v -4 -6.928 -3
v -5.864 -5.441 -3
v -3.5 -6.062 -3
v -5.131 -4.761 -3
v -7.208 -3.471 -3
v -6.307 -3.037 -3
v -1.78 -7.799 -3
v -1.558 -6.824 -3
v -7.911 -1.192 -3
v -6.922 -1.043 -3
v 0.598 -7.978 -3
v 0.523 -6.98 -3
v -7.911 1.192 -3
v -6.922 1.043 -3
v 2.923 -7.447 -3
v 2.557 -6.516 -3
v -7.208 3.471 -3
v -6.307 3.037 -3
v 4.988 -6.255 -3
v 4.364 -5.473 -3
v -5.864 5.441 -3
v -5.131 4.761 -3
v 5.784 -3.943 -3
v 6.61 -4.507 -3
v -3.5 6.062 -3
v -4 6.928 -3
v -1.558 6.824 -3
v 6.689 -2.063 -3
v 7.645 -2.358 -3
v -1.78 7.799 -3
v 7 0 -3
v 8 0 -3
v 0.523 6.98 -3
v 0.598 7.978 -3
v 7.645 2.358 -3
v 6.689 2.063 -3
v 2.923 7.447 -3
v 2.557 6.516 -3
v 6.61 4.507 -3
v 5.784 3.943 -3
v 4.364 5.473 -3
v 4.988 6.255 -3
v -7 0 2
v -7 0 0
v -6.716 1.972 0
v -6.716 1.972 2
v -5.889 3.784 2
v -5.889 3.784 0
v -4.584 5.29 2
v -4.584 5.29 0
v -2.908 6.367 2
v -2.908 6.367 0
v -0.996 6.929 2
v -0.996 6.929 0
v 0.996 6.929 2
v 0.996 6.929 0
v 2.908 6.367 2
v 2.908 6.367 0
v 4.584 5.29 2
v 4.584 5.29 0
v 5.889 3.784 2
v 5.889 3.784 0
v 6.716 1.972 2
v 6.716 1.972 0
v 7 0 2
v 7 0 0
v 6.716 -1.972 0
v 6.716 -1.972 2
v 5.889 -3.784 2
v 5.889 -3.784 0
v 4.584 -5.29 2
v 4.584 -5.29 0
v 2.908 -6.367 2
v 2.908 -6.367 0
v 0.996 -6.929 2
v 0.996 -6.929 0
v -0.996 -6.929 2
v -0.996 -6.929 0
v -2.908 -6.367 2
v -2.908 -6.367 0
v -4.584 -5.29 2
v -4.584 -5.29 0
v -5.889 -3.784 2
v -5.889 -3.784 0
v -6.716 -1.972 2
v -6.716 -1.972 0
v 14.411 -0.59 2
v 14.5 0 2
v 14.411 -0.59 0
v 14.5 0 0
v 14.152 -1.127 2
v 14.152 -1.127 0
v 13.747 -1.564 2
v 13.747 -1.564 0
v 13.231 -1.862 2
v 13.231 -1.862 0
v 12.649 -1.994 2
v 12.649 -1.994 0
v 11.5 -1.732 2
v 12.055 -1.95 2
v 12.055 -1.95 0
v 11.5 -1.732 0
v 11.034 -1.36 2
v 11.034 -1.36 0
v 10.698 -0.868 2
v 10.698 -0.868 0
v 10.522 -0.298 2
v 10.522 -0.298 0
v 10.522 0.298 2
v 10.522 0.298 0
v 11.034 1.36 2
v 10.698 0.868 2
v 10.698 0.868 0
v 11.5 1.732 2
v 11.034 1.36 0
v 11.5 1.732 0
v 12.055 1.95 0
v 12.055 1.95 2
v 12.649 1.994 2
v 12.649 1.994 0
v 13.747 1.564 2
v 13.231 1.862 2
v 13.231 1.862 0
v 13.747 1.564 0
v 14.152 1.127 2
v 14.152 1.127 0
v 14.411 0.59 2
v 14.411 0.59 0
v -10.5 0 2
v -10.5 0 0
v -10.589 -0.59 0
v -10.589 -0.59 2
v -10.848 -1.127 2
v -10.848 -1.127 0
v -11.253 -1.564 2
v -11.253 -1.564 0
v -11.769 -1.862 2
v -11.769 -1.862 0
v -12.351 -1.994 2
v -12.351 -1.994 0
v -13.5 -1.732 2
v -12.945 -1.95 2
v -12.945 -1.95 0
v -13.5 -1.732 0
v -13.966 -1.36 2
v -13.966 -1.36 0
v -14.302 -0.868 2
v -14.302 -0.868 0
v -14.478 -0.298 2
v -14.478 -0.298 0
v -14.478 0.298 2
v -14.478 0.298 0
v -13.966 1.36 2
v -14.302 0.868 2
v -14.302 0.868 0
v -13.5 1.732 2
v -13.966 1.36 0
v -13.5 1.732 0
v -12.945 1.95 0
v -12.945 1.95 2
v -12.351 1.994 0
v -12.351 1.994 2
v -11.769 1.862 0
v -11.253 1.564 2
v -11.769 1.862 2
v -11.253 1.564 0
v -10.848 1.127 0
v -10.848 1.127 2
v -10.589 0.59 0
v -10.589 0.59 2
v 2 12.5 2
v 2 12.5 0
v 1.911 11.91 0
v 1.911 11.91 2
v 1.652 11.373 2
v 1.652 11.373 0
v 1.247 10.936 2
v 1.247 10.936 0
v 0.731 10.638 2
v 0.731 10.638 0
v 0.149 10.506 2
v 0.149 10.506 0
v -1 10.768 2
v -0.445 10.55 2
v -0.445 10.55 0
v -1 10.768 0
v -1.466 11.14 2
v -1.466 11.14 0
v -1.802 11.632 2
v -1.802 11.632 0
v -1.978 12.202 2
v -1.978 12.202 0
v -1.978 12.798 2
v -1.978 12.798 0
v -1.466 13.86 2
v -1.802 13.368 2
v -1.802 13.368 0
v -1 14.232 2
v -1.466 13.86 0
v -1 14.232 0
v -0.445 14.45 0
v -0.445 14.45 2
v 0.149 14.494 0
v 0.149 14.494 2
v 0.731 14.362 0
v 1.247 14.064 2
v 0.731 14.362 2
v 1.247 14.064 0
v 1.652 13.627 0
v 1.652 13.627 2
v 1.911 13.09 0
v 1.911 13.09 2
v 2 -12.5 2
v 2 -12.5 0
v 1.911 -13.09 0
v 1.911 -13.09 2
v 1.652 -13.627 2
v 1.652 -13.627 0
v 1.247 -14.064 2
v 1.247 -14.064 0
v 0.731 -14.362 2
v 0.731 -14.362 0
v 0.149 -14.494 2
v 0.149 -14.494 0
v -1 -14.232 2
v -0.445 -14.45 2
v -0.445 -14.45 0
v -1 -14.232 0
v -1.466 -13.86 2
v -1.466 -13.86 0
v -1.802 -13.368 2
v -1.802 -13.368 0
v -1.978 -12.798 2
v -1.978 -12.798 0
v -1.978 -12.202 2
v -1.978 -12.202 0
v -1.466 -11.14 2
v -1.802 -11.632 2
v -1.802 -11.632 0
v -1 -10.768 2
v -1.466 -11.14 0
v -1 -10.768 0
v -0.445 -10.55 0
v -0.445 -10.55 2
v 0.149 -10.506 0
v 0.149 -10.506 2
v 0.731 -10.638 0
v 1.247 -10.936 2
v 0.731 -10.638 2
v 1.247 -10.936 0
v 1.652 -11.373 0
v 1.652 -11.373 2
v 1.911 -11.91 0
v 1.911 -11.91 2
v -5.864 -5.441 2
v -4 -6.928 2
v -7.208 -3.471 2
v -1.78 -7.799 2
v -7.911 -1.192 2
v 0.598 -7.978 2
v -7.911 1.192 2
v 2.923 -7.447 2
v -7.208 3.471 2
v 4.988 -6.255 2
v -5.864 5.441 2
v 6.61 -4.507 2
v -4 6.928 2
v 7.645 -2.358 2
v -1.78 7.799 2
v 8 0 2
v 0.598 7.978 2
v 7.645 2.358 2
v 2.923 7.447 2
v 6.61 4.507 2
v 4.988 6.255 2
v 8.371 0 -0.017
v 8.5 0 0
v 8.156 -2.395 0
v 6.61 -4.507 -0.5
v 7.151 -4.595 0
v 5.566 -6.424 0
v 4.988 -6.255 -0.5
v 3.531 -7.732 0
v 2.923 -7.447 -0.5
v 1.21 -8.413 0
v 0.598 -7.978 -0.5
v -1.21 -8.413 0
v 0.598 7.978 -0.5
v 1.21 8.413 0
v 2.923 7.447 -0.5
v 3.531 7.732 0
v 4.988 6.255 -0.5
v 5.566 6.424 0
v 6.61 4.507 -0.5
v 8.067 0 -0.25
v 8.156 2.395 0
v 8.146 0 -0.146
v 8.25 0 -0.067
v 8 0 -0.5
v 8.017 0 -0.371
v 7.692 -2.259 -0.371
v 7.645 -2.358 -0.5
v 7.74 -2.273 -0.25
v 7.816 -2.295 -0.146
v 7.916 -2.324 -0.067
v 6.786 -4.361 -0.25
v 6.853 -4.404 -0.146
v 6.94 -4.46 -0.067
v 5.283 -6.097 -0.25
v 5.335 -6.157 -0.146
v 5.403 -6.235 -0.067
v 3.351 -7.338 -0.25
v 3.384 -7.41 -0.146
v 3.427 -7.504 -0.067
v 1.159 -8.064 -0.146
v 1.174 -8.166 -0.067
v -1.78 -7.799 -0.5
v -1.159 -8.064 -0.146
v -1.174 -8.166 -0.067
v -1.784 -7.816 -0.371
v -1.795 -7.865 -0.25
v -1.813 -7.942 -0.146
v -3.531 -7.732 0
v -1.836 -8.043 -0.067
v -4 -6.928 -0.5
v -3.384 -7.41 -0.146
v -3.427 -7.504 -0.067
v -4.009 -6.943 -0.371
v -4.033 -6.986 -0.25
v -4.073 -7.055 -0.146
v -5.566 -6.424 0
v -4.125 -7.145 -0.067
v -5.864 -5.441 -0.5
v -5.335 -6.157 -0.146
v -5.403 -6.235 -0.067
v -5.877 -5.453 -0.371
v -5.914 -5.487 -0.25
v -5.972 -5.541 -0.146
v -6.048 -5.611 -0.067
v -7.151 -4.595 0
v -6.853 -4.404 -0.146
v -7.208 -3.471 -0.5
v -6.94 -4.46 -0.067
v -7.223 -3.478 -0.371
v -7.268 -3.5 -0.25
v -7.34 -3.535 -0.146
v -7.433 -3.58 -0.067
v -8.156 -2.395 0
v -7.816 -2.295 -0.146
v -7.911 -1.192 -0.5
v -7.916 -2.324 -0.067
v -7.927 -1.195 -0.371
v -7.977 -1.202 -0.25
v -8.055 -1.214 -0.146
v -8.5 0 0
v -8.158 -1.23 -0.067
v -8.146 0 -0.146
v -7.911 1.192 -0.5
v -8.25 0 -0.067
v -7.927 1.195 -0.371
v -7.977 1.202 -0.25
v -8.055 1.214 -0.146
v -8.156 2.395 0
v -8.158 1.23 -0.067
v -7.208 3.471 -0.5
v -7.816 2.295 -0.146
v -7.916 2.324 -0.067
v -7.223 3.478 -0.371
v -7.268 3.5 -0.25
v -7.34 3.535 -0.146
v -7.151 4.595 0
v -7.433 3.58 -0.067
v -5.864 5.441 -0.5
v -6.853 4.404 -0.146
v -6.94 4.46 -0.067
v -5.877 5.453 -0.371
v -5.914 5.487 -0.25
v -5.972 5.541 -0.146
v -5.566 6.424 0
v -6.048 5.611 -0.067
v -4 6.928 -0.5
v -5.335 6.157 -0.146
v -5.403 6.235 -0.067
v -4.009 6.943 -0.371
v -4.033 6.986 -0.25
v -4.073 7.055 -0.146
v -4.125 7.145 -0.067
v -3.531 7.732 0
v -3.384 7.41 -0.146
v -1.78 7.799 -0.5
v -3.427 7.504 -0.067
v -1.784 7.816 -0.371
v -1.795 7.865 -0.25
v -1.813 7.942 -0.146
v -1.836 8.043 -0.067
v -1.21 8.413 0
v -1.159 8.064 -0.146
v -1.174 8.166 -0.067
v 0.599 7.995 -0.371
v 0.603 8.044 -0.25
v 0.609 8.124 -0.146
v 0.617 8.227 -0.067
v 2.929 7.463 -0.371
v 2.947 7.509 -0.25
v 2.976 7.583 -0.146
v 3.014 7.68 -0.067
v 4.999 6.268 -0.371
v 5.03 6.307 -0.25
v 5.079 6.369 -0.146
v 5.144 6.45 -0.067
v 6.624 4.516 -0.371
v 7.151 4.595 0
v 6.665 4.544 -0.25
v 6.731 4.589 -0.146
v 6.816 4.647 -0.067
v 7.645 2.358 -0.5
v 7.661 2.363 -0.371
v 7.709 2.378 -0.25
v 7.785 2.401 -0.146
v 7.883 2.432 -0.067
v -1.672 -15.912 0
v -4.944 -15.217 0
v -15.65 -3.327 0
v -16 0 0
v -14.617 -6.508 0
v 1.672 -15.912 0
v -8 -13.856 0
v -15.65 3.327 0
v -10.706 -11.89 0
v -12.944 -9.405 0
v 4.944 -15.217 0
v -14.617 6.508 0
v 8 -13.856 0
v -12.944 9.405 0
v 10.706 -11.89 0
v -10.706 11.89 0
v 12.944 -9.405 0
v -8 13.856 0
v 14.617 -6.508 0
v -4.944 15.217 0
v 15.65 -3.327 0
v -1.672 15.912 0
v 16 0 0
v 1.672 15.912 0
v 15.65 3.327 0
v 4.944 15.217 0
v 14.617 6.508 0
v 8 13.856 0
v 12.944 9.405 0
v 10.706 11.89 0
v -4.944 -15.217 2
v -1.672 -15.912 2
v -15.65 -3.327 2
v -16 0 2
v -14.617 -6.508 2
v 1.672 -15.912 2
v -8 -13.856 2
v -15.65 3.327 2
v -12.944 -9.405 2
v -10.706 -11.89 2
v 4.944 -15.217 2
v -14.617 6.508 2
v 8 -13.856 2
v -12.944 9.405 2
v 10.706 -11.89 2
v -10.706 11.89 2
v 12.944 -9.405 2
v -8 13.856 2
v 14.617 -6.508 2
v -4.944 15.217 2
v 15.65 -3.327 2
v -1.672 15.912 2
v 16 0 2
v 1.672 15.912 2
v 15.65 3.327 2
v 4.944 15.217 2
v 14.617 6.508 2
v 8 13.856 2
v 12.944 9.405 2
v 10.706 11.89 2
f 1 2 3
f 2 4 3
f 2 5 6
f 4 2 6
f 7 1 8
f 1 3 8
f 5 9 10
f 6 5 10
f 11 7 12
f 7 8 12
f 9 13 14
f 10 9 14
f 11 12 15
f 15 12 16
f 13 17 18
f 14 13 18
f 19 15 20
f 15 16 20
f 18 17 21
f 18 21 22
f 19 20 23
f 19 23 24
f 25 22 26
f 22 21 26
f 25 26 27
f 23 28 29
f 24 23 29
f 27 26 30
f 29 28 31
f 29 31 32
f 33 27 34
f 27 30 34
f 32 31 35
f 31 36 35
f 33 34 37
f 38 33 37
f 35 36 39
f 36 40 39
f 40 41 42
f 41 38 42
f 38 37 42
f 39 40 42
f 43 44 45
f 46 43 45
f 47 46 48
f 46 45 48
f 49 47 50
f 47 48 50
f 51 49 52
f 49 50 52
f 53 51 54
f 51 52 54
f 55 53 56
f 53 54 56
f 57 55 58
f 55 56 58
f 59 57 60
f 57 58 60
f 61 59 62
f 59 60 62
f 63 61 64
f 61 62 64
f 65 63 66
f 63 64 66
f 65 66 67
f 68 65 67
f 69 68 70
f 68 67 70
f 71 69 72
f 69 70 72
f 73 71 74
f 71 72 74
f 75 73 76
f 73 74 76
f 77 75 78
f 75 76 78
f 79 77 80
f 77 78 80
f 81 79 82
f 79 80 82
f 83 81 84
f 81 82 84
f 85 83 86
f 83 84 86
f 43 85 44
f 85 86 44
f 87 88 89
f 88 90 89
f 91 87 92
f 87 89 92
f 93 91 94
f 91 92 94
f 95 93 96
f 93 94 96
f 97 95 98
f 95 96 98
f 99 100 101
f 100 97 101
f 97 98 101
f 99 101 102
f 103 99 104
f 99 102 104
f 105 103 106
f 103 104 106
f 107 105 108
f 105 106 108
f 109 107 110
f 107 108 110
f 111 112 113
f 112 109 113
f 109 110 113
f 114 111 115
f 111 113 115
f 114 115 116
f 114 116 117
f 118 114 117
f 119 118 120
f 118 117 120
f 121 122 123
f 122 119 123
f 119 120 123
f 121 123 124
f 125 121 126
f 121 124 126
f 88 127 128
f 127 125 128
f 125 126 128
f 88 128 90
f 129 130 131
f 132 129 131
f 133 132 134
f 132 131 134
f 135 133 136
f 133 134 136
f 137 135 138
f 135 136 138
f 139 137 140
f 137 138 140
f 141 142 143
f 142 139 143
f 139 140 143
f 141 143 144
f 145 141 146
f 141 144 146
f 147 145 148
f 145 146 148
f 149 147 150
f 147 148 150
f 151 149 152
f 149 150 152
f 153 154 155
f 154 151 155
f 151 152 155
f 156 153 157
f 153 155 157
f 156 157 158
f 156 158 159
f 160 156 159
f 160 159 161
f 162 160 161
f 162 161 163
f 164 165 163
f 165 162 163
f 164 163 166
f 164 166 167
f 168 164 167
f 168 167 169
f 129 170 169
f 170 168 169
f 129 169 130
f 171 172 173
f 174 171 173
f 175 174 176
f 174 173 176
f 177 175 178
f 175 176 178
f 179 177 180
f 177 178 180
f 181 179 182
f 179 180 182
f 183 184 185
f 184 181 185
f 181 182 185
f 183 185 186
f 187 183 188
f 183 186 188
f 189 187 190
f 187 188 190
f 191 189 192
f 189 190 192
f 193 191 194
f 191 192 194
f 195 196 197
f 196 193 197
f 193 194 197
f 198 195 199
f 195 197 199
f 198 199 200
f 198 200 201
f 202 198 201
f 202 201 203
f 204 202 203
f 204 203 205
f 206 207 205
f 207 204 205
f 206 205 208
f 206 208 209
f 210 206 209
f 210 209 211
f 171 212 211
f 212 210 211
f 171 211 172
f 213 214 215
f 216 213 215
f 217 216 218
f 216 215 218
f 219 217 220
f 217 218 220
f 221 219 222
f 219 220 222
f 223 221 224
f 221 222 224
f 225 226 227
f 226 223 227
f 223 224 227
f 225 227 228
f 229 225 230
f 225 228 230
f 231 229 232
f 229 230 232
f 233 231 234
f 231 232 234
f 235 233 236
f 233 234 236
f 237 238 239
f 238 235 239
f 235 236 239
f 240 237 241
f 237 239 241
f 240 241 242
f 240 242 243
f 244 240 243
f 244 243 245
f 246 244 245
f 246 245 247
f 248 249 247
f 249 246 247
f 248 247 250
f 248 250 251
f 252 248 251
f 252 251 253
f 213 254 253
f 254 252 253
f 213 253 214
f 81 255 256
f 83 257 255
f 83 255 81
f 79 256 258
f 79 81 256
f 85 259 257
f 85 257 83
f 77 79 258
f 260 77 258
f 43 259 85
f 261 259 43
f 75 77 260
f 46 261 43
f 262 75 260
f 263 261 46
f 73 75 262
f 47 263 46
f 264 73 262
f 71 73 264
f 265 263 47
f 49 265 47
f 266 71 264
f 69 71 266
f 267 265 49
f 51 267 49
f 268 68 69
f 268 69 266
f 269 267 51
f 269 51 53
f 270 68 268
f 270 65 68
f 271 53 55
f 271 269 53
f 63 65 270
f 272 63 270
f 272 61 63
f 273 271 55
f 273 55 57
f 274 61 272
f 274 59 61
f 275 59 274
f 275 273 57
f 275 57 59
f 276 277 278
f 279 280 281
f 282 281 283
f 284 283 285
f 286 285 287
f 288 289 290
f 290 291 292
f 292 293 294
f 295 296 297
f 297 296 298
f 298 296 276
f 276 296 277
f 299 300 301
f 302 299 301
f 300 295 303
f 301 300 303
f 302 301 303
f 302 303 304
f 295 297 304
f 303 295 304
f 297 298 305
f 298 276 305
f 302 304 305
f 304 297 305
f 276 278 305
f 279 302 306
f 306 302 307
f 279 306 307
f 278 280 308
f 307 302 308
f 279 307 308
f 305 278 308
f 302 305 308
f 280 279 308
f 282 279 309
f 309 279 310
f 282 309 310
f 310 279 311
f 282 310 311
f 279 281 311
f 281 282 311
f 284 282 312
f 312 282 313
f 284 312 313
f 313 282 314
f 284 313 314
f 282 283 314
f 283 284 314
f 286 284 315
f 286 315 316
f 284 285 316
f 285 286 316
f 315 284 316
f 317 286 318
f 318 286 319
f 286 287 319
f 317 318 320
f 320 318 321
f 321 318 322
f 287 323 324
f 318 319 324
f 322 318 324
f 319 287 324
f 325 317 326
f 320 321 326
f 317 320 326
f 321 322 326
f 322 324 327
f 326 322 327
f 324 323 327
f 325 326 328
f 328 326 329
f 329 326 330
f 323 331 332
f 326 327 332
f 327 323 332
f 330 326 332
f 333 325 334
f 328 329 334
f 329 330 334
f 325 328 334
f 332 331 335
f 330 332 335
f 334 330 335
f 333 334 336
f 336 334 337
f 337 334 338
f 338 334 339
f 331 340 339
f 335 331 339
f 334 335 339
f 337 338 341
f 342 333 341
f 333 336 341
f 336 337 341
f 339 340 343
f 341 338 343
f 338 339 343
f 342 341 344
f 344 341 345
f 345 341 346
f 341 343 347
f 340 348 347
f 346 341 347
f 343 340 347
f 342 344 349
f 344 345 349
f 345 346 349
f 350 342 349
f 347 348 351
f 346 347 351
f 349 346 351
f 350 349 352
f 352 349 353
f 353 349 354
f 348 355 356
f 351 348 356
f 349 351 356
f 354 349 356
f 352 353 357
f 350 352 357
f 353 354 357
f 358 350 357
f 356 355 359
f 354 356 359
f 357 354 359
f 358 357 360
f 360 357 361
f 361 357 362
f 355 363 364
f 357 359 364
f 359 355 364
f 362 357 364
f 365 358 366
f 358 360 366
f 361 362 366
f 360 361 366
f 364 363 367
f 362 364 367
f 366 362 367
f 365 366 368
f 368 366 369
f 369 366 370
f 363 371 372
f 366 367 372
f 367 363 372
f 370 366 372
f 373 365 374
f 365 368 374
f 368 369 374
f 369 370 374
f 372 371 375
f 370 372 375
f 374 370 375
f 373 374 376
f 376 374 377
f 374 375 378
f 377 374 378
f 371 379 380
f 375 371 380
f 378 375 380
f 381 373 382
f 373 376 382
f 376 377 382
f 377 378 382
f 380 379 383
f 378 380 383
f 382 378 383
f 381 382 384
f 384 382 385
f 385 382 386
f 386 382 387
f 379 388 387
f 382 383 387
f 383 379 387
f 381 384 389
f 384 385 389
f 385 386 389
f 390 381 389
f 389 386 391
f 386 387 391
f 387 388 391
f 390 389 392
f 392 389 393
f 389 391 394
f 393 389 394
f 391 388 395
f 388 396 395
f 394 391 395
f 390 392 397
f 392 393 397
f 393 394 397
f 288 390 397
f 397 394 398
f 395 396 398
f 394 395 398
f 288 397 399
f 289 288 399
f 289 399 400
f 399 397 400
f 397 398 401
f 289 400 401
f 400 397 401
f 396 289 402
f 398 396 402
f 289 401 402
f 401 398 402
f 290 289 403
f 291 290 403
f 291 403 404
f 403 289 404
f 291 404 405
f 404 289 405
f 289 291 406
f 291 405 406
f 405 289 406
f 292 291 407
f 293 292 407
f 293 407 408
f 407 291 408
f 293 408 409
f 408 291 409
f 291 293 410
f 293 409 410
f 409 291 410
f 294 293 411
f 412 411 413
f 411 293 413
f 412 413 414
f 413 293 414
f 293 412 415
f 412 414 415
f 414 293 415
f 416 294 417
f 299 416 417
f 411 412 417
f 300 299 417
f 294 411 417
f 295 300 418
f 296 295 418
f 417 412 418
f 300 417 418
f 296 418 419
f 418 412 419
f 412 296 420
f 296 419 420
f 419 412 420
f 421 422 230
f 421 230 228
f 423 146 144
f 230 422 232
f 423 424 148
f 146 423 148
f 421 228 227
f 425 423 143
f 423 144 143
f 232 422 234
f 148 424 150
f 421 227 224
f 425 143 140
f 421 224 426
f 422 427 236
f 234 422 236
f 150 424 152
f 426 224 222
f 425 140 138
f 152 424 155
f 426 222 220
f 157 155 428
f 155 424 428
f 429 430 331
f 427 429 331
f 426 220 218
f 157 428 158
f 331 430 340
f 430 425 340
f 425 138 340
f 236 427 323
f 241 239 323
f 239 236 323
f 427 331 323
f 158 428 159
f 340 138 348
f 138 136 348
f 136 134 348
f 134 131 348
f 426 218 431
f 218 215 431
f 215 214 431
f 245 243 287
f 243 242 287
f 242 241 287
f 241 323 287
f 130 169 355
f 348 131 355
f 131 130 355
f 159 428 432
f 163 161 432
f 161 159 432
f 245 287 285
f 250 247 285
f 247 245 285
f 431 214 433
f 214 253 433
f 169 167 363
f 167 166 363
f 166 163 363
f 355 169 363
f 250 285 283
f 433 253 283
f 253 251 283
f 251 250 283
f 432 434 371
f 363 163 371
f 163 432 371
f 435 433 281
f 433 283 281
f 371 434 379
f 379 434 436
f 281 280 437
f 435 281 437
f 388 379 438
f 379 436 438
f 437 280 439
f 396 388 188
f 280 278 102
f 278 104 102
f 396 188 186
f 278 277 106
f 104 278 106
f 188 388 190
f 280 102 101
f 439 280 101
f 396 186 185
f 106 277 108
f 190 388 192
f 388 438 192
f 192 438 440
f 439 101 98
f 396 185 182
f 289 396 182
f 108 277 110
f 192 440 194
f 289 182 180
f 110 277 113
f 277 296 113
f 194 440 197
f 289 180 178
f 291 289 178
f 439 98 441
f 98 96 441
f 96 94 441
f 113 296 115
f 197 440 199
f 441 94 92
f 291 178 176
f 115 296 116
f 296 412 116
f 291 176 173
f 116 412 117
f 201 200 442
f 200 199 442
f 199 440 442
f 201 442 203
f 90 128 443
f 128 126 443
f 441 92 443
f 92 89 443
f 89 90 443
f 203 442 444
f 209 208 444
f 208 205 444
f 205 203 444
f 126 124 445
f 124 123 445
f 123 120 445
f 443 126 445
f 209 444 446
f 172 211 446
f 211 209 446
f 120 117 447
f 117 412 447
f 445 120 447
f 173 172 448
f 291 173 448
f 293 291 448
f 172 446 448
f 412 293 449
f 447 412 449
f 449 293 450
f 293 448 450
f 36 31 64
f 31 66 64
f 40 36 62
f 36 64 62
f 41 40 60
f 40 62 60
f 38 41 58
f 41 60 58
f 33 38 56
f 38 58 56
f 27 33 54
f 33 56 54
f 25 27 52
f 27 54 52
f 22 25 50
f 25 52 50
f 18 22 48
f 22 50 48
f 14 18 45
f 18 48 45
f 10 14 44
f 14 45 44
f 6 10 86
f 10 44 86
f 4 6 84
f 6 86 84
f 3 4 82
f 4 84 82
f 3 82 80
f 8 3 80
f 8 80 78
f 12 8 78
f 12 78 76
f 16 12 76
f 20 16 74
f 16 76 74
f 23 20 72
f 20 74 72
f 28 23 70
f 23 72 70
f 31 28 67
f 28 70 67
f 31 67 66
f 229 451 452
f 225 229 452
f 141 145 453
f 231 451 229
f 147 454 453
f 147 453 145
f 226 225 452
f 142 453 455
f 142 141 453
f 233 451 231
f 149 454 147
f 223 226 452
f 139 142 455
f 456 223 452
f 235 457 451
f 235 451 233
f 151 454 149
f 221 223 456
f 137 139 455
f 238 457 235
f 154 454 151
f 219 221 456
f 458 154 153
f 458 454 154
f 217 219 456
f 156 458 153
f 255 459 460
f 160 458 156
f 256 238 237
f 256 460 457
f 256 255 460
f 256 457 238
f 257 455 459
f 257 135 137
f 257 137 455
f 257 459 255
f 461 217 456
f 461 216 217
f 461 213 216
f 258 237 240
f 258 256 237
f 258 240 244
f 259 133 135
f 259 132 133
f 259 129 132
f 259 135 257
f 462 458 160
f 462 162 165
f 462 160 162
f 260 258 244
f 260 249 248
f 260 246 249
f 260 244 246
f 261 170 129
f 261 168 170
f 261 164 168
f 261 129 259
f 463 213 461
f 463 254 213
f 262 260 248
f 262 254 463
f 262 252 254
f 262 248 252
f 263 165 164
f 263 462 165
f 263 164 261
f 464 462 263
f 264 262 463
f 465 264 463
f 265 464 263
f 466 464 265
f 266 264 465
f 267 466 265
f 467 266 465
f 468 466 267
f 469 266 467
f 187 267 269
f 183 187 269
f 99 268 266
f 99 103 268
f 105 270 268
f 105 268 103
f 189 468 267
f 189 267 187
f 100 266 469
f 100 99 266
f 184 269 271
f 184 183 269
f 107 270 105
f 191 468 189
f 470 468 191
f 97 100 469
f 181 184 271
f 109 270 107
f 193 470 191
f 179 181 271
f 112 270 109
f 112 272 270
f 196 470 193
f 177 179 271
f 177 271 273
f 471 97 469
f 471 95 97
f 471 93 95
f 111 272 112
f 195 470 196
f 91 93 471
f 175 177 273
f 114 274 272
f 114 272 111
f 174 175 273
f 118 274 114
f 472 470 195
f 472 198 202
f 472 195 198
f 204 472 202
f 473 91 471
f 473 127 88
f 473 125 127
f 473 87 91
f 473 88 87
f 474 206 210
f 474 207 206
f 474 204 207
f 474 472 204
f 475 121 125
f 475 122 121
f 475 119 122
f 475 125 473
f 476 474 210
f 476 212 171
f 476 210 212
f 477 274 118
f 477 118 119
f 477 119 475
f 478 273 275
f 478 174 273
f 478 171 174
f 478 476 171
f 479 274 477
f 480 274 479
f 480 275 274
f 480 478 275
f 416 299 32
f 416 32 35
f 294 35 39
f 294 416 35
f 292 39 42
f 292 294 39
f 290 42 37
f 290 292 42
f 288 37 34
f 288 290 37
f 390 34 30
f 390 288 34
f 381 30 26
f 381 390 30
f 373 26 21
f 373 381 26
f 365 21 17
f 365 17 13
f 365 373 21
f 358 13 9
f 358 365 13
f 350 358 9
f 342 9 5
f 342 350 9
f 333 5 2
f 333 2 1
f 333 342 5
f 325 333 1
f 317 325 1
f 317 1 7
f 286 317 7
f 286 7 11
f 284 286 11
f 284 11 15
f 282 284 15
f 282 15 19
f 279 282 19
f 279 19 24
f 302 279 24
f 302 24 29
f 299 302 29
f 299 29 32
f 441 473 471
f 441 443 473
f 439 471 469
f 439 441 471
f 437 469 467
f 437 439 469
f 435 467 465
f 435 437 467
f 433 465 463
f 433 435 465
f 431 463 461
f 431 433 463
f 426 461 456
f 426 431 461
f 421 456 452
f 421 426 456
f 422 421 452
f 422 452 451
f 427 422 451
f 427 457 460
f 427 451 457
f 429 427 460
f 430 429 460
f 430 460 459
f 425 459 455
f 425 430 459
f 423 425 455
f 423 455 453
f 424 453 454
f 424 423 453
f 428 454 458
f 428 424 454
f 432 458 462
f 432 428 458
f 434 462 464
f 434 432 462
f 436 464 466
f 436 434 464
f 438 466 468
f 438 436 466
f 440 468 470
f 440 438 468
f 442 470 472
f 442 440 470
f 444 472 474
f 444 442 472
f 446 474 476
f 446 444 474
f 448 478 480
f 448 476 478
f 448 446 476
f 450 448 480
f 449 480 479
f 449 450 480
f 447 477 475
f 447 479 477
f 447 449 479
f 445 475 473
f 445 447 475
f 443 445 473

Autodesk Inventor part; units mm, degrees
ref_plane "YZ Plane" through (0, 0, 0) normal (1, 0, 0) x (0, 1, 0)
ref_plane "XZ Plane" through (0, 0, 0) normal (0, 1, 0) x (-1, 0, 0)
ref_plane "XY Plane" through (0, 0, 0) normal (0, 0, 1) x (1, 0, 0)
sketch "Sketch1" plane through (0, 0, 0) normal (0, 0, 1) x (1, 0, 0)
  circle A0 centre (0, 0) radius 7
  circle A1 centre (0, 0) radius 16
  circle A2 centre (-12.5, 0) radius 2
  circle A3 centre (0, -12.5) radius 2
  circle A4 centre (12.5, 0) radius 2
  circle A5 centre (0, 12.5) radius 2
  circle A6 centre (0, 0) radius 8
  line L0 (0, 0) -> (-12.5, 0)
  point P0 (-7, 0)
  point P1 (-7.7857, 1.8392)
  dimension "d0" = 14
  dimension "d8" = 16
  dimension "d1" = 32
  dimension "d2" = 4
  dimension "d5" = 360
  dimension "d15" = 12.5
extrude "Extrusion1" add sketch "Sketch1" along normal blind 2 contours A1
extrude "Extrusion2" add sketch "Sketch1" against normal blind 3 contours A6
extrude "Extrusion3" add sketch "Sketch1" along normal blind 2 contours A6
fillet "Fillet2" radius 0.5 1 edges at (-8, 0, 0)
properties part number "flange"
